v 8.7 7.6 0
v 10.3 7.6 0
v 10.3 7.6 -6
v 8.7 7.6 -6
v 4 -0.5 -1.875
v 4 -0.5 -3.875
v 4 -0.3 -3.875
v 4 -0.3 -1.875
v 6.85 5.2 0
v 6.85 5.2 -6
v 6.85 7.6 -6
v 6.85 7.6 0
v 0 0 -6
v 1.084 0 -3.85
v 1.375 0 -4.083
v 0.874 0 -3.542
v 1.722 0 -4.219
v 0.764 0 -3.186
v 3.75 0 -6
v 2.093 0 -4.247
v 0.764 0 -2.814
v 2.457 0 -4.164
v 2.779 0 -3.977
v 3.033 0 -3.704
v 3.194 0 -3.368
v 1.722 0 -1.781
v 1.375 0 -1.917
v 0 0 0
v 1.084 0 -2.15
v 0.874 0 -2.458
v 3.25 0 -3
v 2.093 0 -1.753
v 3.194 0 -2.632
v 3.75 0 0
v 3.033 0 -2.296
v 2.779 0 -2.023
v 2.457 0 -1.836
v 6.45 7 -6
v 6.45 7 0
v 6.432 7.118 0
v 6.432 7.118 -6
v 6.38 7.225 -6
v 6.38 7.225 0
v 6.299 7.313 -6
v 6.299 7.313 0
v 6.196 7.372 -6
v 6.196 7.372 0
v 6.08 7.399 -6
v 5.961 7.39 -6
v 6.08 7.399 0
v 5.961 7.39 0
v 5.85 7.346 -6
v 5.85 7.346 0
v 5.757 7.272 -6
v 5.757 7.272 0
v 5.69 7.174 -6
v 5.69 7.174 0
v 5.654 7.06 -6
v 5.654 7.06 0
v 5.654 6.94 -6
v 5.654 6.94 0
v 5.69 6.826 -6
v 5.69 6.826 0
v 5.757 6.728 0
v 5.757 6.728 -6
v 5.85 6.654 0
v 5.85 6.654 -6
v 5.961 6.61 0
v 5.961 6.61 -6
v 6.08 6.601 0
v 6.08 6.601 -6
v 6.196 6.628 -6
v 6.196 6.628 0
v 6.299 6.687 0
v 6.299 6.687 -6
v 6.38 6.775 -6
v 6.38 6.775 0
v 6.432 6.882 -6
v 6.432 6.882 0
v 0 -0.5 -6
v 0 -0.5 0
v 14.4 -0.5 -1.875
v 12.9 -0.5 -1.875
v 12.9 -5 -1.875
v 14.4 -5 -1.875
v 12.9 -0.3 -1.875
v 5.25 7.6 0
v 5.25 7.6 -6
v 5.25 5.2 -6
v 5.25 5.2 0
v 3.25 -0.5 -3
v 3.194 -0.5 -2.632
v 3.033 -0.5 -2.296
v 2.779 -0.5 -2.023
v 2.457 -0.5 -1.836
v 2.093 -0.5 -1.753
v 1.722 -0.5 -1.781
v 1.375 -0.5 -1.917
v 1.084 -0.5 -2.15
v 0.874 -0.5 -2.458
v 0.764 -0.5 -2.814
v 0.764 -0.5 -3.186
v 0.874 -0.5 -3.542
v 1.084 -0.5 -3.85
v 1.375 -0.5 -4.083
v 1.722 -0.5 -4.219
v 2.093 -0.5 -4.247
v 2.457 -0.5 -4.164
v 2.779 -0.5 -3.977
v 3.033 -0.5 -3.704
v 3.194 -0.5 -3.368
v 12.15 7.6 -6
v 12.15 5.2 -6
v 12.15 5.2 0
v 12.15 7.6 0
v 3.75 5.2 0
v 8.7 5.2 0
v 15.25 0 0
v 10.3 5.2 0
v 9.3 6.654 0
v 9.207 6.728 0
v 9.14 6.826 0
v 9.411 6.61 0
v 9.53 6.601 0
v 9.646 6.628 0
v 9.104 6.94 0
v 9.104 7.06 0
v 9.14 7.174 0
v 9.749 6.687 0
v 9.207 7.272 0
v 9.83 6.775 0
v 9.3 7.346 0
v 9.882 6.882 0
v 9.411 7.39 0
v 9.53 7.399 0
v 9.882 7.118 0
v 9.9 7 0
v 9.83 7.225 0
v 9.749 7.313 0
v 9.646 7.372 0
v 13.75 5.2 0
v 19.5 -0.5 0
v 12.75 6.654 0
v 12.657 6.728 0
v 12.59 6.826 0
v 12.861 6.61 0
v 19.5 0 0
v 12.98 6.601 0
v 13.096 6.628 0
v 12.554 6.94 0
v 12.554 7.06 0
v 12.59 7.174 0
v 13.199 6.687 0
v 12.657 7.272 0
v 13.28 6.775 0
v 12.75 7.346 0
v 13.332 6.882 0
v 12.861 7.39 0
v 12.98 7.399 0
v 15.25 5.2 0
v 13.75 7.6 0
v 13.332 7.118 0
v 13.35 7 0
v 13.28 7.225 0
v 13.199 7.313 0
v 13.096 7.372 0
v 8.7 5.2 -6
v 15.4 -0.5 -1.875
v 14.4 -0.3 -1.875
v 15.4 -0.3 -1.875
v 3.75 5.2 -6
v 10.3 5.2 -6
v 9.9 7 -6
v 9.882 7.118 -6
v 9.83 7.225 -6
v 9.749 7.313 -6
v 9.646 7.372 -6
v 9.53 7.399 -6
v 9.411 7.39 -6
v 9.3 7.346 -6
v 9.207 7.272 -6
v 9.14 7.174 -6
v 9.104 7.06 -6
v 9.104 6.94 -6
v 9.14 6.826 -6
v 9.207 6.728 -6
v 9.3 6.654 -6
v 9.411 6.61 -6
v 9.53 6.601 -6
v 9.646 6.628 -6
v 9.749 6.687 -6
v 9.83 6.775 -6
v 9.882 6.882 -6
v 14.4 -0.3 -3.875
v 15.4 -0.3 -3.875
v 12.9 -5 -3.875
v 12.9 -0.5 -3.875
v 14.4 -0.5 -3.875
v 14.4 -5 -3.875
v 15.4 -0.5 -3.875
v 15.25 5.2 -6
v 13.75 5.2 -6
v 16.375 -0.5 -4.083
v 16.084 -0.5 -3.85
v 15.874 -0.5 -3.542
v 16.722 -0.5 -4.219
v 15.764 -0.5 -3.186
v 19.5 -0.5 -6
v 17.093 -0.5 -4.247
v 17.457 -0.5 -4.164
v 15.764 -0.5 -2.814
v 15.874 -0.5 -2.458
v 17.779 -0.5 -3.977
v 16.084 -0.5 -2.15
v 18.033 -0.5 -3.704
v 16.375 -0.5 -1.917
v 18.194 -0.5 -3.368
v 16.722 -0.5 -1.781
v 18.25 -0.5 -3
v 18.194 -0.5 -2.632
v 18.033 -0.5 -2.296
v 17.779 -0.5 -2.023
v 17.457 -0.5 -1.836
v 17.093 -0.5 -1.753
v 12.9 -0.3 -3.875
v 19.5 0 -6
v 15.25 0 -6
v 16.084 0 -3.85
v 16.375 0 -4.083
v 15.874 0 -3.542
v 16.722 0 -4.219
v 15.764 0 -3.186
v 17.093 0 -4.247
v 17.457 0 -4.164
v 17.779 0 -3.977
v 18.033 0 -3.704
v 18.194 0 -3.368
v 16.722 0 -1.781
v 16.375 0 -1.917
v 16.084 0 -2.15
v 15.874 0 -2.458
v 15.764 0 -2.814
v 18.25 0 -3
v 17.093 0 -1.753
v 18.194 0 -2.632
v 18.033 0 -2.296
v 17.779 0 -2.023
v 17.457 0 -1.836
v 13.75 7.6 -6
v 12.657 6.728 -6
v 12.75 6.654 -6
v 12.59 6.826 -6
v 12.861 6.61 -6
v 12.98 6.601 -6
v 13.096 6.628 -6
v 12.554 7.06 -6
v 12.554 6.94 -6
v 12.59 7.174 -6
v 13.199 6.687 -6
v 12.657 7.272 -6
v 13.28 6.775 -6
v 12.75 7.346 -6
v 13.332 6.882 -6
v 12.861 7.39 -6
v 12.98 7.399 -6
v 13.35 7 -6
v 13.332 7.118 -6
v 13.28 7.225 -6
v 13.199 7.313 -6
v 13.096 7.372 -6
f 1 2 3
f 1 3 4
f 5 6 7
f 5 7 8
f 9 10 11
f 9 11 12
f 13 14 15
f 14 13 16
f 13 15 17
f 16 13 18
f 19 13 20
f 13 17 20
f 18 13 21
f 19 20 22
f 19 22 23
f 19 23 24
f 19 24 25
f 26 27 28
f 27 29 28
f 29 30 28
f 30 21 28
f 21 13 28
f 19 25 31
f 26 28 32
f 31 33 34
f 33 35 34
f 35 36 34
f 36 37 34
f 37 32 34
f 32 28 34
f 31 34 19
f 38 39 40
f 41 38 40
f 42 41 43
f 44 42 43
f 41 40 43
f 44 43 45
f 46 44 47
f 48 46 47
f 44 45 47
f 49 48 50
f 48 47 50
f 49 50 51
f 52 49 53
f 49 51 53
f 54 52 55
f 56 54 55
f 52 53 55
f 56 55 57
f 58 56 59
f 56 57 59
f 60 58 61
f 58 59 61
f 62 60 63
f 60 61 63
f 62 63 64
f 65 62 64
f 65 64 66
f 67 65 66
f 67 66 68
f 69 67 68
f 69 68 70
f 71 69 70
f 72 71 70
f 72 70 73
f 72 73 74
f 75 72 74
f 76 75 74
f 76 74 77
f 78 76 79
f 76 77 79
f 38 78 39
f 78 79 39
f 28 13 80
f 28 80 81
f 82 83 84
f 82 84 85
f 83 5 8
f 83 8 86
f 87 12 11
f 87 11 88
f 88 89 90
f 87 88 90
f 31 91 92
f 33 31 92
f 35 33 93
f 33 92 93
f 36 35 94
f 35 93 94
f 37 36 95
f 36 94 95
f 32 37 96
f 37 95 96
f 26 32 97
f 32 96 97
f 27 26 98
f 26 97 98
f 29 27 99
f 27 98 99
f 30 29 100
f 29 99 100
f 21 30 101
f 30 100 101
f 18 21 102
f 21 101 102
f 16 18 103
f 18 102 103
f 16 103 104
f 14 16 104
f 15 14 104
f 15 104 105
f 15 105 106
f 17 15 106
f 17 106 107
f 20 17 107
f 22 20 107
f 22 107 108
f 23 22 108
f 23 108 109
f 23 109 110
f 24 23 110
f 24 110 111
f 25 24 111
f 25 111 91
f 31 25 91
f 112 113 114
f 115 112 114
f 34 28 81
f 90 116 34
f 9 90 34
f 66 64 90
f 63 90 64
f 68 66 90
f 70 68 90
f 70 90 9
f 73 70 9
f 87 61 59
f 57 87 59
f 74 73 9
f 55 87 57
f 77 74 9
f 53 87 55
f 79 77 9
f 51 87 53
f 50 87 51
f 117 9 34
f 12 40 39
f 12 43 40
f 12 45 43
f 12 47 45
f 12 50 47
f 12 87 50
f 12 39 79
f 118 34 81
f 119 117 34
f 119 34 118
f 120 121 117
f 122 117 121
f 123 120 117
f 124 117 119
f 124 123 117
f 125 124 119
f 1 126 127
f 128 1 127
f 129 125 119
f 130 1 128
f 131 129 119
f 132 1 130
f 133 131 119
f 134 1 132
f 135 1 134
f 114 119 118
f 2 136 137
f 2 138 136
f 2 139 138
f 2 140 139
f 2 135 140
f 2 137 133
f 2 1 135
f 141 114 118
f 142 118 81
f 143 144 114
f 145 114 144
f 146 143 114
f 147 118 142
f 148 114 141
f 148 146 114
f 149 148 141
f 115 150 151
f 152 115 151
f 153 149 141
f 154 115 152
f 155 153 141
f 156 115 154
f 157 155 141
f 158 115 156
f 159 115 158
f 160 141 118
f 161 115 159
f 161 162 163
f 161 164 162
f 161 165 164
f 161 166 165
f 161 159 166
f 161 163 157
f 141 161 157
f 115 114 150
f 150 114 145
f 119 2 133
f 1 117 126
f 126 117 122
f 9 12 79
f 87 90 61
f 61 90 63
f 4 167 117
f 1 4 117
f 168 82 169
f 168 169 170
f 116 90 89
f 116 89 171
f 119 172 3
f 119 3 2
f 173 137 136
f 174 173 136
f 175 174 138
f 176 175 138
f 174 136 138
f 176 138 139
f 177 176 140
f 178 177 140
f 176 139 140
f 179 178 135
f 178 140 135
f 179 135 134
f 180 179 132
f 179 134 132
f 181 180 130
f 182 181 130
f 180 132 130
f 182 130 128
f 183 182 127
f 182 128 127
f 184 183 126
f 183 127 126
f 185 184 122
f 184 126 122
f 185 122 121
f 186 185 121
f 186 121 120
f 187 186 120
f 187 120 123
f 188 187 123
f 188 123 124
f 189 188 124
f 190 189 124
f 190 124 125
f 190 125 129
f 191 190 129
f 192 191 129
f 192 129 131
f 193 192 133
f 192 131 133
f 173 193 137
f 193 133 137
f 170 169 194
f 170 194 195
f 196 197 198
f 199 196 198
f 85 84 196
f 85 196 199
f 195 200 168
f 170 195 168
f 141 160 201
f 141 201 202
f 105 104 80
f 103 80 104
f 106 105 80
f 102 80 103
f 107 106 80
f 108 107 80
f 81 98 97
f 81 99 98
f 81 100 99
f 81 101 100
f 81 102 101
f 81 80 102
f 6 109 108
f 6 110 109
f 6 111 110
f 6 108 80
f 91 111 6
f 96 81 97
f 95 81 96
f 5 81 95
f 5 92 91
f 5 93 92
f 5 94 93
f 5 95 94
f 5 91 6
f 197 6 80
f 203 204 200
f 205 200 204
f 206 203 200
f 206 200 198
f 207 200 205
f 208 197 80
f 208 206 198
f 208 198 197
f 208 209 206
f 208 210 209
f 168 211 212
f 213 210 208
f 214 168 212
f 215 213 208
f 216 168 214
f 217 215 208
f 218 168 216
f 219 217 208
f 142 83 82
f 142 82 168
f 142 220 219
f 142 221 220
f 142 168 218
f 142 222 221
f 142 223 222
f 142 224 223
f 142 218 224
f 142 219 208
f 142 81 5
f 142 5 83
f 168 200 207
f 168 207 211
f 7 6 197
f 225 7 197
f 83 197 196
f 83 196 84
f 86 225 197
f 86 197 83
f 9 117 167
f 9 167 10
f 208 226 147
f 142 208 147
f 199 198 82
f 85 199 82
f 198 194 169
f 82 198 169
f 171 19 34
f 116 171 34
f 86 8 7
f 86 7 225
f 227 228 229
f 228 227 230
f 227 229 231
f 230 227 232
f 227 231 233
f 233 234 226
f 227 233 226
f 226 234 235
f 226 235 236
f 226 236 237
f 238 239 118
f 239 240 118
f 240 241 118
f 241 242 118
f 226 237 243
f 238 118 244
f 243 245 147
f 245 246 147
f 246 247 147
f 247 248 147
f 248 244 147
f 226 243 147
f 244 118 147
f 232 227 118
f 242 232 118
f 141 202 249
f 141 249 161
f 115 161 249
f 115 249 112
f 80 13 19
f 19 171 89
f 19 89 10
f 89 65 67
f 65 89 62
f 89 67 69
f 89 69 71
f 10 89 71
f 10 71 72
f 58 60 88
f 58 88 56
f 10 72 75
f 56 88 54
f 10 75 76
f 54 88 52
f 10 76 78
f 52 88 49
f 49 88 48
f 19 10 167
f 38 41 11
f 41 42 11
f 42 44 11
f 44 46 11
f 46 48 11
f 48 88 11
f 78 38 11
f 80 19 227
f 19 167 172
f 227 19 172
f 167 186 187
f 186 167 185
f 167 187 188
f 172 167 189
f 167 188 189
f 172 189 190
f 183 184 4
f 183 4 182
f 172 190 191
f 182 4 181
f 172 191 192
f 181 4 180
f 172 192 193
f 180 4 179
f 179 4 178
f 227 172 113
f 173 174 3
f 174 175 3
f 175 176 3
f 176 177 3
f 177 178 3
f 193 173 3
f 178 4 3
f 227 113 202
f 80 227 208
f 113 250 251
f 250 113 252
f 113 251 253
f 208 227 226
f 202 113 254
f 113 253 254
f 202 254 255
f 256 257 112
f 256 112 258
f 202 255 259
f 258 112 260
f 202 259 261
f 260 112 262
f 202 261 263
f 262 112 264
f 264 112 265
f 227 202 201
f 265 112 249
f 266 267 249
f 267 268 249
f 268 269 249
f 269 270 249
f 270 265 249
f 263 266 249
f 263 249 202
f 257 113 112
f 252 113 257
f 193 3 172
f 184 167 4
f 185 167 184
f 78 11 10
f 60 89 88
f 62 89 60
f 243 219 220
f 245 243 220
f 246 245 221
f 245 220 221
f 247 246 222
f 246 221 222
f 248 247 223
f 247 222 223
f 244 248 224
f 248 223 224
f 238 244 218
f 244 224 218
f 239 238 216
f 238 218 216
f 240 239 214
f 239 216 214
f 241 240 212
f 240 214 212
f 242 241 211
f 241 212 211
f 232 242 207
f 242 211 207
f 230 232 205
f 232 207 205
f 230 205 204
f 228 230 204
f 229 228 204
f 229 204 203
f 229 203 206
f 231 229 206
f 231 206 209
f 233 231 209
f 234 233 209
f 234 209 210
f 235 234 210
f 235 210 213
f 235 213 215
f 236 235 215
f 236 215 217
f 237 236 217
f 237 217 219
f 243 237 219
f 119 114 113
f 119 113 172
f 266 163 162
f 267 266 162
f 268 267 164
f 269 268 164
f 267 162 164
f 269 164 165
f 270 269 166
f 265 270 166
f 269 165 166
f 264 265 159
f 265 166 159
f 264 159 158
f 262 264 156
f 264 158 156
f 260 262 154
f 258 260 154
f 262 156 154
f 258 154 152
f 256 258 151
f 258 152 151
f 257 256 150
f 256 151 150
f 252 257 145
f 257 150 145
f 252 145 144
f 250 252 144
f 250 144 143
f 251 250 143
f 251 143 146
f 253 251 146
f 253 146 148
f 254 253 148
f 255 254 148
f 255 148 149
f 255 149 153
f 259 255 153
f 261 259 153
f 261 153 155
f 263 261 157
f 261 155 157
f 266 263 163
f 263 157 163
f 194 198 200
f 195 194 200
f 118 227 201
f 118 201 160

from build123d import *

# Parameters (mm, degrees)
F0_W      = 19.5
F0_H      = 6
F1_DEPTH  = 0.5
F2_R      = 1.25
F3_DEPTH  = 3
F4_W      = 11.4
F4_H      = 2
F5_DEPTH  = 0.2
F6_W      = 1.5
F6_H      = 2
F7_DEPTH  = 4.7
F8_W      = 11.5
F8_H      = 6
F9_DEPTH  = 5.2
F10_W     = 1.6
F10_H     = 6
F11_DEPTH = 2.4
F12_R     = 0.4
F13_DEPTH = 6


with BuildPart() as f1:
    # F0 (on Front) → F1 (new body)
    with BuildSketch(Plane.XZ):
        with Locations((9.75, -3)):
            Rectangle(F0_W, F0_H)
    extrude(amount=F1_DEPTH)

    # F2 (on face) → F3 (cut)
    with BuildSketch(Plane.XZ.offset(0.5)):
        with Locations((2, -3)):
            Circle(F2_R)
        with Locations((17, -3)):
            Circle(F2_R)
    extrude(amount=-F3_DEPTH, mode=Mode.SUBTRACT)

    # F4 (on face) → F5 (cut)
    with BuildSketch(Plane.XZ.offset(0.5)):
        with Locations((9.7, -2.875332)):
            Rectangle(F4_W, F4_H)
    extrude(amount=-F5_DEPTH, mode=Mode.SUBTRACT)

    # F6 (on face) → F7 (join)
    with BuildSketch(Plane.XZ.offset(0.3)):
        with Locations((13.65, -2.875332)):
            Rectangle(F6_W, F6_H)
    extrude(amount=F7_DEPTH)

    # F8 (on face) → F9 (join)
    with BuildSketch(Plane(origin=(0, 0, 0), x_dir=(-1, 0, 0), z_dir=(0, 1, 0))):
        with Locations((-9.5, -3)):
            Rectangle(F8_W, F8_H)
    extrude(amount=F9_DEPTH)

    # F10 (on face) → F11 (join)
    with BuildSketch(Plane(origin=(0, 5.2, 0), x_dir=(-1, 0, 0), z_dir=(0, 1, 0))):
        with Locations((-12.95, -3)):
            Rectangle(F10_W, F10_H)
        with Locations((-9.5, -3)):
            Rectangle(F10_W, F10_H)
        with Locations((-6.05, -3)):
            Rectangle(F10_W, F10_H)
    extrude(amount=F11_DEPTH)

    # F12 (on face) → F13 (cut)
    with BuildSketch(Plane.XY):
        with Locations((12.95, 7)):
            Circle(F12_R)
        with Locations((9.5, 7)):
            Circle(F12_R)
        with Locations((6.05, 7)):
            Circle(F12_R)
    extrude(amount=-F13_DEPTH, mode=Mode.SUBTRACT)


solid = f1.part
